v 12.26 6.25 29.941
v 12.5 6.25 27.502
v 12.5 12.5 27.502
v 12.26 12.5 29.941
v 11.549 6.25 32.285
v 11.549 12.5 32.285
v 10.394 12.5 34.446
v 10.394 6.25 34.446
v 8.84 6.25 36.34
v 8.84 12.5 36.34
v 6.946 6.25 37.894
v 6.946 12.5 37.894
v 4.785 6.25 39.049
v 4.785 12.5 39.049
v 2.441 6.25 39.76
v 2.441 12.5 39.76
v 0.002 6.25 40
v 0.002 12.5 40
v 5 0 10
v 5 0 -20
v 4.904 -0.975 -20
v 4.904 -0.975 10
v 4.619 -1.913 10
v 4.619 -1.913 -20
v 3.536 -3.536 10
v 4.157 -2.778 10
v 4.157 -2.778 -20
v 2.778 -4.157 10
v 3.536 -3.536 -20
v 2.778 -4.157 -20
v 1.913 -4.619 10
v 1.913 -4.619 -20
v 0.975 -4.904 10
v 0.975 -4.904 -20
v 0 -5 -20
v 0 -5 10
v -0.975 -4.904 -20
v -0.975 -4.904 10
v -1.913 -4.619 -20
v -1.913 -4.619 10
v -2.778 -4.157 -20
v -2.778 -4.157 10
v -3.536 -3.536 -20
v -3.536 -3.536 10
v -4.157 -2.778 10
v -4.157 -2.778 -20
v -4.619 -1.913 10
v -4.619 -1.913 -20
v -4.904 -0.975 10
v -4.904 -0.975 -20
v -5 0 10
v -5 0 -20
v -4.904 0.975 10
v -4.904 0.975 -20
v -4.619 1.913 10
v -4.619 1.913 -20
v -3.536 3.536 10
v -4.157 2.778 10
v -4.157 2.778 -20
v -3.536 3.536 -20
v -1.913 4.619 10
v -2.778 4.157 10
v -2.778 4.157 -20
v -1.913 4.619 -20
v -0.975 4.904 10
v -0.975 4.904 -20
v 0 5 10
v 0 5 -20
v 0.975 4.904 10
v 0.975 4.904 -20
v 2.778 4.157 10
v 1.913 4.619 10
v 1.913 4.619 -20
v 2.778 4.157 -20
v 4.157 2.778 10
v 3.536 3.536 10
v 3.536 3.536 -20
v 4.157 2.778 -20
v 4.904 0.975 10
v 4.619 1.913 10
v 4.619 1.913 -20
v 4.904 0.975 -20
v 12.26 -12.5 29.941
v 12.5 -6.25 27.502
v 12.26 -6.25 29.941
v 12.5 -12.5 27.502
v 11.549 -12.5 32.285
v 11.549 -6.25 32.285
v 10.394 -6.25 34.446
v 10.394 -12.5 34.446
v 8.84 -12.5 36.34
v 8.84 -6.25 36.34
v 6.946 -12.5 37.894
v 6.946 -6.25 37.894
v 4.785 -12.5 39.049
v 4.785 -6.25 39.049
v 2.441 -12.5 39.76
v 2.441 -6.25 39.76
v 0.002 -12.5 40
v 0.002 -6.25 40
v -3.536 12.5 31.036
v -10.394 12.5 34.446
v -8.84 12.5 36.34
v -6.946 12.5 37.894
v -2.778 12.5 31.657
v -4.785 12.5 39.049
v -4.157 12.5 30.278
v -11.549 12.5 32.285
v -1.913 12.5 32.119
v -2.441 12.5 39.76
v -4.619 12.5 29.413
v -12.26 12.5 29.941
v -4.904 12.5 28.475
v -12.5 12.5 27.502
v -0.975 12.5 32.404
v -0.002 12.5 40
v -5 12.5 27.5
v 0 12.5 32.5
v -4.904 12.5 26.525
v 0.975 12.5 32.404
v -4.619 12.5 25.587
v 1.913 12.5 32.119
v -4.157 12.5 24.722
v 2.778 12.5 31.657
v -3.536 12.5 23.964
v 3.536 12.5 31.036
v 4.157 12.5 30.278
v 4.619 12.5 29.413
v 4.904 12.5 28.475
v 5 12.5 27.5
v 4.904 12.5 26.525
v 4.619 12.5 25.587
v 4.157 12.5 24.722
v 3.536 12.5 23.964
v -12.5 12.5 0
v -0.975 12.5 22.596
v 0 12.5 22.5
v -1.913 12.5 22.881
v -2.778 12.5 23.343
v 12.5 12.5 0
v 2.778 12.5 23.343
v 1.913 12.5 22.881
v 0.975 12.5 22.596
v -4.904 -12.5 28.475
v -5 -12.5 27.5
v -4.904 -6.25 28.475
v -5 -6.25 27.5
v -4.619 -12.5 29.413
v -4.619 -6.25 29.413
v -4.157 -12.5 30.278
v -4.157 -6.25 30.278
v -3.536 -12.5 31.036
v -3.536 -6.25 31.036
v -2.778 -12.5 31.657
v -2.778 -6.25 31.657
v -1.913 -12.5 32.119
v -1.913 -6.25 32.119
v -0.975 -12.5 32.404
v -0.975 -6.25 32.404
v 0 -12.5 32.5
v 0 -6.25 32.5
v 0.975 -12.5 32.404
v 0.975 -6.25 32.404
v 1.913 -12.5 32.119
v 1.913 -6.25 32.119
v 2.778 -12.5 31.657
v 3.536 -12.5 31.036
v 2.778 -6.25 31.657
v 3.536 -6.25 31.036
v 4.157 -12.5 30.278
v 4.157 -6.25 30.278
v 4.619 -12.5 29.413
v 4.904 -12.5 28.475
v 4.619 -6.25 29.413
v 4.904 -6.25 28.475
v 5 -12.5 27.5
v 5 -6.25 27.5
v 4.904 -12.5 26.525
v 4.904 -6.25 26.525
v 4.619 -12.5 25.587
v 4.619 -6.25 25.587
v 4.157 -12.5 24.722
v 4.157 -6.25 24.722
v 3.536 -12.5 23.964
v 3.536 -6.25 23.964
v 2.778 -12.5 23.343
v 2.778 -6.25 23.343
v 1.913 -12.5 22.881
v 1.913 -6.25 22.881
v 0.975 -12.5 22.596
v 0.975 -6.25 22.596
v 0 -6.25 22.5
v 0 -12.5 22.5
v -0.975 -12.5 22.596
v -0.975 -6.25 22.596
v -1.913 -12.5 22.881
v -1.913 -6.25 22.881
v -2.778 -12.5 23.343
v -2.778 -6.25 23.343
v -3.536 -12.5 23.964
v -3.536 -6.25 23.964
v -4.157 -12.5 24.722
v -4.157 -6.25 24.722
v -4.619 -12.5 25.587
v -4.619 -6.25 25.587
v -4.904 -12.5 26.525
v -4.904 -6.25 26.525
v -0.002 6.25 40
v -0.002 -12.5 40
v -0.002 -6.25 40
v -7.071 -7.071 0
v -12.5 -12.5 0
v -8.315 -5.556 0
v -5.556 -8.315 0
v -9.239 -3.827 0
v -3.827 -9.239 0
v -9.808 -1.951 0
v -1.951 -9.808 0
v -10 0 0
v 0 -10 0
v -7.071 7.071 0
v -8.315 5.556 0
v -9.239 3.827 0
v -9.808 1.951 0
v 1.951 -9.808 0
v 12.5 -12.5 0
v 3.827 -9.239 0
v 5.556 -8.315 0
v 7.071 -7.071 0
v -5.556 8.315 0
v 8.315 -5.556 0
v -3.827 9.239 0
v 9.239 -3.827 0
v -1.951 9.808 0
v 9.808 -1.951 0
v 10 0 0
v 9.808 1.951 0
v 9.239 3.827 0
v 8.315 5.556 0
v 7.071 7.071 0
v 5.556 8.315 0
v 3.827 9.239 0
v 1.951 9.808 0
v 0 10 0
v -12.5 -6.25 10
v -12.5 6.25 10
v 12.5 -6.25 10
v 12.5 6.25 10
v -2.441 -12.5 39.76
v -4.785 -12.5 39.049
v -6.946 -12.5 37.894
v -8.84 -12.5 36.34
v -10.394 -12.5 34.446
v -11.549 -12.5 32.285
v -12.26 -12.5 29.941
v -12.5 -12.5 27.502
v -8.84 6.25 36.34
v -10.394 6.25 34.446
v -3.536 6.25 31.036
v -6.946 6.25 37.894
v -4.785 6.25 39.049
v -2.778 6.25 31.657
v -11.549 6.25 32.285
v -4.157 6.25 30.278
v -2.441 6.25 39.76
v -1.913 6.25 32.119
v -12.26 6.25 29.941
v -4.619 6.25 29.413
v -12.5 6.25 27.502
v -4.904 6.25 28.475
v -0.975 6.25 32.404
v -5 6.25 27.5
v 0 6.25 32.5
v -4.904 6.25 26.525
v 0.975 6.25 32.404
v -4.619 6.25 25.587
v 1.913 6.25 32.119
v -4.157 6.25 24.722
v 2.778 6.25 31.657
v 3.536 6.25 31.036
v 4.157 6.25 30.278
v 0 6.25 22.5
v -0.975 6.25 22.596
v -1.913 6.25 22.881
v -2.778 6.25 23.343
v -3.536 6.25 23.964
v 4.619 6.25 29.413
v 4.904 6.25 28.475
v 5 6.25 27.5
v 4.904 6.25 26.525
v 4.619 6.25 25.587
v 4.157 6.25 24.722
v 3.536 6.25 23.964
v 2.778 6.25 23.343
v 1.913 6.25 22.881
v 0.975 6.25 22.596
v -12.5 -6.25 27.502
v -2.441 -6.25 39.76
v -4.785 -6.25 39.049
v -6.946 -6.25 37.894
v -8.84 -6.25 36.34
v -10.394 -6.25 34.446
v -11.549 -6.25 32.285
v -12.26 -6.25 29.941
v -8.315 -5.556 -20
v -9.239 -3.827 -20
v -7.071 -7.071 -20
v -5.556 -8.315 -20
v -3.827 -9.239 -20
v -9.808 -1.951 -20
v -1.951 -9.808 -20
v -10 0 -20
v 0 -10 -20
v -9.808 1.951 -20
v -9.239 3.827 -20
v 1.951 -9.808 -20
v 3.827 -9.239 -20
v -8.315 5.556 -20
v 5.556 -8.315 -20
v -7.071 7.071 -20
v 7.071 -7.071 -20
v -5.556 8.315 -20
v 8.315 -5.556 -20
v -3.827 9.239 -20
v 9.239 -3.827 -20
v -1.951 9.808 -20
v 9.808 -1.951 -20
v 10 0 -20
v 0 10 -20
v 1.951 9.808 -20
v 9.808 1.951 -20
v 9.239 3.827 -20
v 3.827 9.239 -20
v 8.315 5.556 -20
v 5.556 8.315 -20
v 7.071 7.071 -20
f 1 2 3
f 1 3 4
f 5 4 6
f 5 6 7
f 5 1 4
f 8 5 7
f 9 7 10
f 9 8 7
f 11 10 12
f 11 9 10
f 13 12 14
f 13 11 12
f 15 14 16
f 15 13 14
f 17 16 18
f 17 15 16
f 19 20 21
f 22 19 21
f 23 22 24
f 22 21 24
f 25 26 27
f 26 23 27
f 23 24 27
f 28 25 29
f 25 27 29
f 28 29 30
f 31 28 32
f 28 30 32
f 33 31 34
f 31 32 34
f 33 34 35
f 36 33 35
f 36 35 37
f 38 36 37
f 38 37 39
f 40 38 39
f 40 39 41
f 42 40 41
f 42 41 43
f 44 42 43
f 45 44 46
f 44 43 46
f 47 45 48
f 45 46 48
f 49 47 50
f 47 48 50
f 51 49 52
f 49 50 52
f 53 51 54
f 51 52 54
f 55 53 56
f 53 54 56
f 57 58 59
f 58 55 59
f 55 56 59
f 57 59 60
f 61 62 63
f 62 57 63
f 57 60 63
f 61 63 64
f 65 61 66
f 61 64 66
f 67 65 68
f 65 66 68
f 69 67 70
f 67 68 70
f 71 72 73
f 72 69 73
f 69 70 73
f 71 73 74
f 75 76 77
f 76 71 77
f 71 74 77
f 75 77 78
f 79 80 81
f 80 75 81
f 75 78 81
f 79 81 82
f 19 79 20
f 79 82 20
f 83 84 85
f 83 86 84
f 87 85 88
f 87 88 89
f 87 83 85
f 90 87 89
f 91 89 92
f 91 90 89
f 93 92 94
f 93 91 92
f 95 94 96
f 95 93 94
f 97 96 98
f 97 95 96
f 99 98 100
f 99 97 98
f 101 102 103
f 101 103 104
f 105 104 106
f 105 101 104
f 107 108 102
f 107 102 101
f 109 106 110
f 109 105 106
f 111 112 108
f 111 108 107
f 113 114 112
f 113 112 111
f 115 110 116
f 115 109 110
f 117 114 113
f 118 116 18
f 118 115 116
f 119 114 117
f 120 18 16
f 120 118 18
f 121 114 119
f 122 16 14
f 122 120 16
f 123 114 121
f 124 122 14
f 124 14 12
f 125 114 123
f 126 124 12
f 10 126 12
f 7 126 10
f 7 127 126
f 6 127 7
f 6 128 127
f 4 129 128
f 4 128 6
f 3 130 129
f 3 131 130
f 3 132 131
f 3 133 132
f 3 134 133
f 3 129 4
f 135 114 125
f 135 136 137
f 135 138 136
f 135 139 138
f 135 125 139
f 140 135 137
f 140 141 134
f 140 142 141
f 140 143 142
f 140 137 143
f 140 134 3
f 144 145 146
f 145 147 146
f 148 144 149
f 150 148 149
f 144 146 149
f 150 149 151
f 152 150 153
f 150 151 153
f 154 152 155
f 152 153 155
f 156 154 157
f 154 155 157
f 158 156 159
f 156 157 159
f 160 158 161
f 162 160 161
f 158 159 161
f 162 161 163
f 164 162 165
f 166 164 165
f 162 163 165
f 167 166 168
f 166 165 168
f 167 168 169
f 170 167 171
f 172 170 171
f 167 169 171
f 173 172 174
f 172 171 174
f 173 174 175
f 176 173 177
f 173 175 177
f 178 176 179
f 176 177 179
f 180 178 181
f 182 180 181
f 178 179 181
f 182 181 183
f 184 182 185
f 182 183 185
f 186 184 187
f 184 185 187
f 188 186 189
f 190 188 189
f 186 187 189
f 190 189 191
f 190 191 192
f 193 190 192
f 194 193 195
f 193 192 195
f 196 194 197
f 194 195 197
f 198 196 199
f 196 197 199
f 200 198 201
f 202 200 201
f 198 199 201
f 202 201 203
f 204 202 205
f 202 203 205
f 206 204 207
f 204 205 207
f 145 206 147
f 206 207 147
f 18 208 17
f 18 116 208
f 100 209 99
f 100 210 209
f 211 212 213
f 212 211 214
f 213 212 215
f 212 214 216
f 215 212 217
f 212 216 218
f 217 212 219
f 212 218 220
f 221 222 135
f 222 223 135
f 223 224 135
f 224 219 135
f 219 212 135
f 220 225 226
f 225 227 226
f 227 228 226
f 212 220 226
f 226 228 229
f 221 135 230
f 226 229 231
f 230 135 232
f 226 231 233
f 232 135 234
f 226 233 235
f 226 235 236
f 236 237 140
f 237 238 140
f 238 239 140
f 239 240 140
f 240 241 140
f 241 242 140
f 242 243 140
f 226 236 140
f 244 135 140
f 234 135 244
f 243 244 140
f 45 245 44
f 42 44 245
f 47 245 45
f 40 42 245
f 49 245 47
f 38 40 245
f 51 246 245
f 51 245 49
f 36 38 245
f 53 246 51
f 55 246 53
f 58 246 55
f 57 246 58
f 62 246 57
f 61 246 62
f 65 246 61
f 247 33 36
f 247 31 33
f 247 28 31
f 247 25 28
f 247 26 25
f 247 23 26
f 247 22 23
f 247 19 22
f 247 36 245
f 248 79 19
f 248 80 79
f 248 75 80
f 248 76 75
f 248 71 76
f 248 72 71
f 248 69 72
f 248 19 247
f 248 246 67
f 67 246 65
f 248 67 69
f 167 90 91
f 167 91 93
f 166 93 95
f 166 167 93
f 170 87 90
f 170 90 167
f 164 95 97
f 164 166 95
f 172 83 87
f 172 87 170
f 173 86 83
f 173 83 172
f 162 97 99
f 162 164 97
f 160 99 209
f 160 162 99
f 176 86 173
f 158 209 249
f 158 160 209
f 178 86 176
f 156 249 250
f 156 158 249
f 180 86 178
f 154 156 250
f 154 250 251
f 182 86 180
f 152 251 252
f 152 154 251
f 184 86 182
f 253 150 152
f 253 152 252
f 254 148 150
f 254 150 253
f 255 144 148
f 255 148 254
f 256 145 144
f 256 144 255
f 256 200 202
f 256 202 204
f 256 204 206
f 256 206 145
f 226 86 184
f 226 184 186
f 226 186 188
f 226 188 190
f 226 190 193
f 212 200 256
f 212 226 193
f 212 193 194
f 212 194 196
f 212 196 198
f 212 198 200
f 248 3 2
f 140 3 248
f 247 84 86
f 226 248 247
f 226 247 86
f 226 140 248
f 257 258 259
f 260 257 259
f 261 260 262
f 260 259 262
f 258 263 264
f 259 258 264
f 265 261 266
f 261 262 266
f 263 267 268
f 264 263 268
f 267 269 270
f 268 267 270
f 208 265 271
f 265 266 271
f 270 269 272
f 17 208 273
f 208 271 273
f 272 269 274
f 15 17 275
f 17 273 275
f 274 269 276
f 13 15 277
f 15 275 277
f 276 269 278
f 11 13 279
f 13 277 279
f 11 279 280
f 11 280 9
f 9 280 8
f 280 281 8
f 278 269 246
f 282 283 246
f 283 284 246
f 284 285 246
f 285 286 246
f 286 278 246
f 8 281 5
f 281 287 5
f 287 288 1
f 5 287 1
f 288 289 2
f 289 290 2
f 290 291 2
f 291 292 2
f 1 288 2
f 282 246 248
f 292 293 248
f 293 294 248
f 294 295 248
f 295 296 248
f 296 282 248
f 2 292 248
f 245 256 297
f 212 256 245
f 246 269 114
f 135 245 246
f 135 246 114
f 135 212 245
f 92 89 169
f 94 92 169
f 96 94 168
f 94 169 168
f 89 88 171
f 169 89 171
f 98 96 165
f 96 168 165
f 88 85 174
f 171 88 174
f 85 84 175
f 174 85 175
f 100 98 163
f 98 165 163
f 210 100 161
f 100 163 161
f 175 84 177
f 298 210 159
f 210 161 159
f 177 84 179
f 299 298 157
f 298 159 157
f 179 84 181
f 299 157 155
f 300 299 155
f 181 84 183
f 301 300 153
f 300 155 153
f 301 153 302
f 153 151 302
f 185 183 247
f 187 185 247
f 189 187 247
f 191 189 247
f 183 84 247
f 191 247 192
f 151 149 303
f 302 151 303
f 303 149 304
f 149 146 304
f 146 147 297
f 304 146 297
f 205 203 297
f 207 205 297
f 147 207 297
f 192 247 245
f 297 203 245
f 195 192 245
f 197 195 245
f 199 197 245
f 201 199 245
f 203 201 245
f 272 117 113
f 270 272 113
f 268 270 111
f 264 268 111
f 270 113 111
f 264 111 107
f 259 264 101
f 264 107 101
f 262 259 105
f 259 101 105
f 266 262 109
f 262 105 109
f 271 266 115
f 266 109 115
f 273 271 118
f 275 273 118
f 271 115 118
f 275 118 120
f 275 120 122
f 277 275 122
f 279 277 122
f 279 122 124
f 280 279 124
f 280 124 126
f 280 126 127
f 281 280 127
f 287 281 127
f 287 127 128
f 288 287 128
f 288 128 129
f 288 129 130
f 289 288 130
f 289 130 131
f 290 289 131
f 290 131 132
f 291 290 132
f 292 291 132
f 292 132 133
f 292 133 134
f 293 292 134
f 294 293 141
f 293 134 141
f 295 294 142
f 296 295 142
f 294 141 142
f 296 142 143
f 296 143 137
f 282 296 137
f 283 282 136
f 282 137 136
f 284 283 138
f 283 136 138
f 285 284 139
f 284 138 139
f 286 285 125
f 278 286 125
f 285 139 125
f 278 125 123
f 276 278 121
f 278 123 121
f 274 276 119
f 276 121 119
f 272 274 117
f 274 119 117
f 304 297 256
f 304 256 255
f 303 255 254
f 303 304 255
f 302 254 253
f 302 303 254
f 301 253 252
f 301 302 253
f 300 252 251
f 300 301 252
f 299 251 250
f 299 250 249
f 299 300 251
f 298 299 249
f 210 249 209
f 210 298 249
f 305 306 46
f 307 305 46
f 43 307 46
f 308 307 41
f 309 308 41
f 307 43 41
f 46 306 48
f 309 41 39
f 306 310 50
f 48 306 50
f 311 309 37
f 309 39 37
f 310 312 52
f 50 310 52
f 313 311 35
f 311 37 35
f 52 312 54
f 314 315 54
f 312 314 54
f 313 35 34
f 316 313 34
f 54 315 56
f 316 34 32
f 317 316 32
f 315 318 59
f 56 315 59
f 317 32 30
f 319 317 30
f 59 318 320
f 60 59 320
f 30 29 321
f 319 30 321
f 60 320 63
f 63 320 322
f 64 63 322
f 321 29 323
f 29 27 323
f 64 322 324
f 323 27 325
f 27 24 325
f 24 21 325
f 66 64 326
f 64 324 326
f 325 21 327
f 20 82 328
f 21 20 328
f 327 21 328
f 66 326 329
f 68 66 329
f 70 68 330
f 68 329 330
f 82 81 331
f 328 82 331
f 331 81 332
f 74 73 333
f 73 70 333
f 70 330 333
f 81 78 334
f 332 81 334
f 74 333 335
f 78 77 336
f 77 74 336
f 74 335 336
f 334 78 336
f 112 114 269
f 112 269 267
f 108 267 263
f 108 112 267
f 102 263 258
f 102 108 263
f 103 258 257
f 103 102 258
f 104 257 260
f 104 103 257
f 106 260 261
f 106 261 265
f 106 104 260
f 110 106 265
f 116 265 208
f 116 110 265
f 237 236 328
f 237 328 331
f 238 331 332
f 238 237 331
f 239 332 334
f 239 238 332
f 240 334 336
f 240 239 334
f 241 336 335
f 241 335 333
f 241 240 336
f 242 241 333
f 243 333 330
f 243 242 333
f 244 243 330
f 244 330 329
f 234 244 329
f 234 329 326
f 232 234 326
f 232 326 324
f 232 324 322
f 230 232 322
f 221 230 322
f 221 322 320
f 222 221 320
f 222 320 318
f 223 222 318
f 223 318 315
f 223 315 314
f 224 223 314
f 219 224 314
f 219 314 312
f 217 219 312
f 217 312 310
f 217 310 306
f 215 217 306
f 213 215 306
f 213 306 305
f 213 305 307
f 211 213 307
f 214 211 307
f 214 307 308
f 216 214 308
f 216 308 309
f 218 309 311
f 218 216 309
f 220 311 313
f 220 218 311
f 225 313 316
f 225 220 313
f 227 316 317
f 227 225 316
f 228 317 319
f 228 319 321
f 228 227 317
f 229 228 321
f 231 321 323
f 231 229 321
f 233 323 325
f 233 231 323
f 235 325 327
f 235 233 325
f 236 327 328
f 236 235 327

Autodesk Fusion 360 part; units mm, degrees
sketch "Sketch1" plane through (0, 0, 0) normal (0, 0, 1) x (1, 0, 0)
  circle A0 centre (0, 0) radius 10
  line L0 (-12.5, 12.5) -> (12.5, 12.5)
  line L1 (12.5, 12.5) -> (12.5, -12.5)
  line L2 (12.5, -12.5) -> (-12.5, -12.5)
  line L3 (-12.5, -12.5) -> (-12.5, 12.5)
  line L4 (-12.5, 6.25) -> (12.5, 6.25)
  line L5 (12.5, 6.25) -> (12.5, -6.25)
  line L6 (12.5, -6.25) -> (-12.5, -6.25)
  line L7 (-12.5, -6.25) -> (-12.5, 6.25)
  circle A1 centre (0, 0) radius 5
  dimension "d1" = 20
  dimension "d2" = 25
  dimension "d3" = 25
  dimension "d4" = 12.5
  dimension "d5" = 12.5
  dimension "d6" = 25
  dimension "d7" = 12.5
  dimension "d8" = 6.25
  dimension "d9" = 10
extrude "Extrude1" add sketch "Sketch1" along normal blind 40 contours A0 L4 | A0 L0 L1 L3 L4 | A0 L1 L2 L3 L6 | A0 L6 makes body 1 at (-4.1667, 6.25, 13.3333) makes body 2 at (4.1667, -6.25, 13.3333)
extrude "Extrude2" add sketch "Sketch1" against normal blind 20 contours A0 L4 L6 | A0 L4 | A0 L6 bodies 1 2
extrude "Extrude3" add sketch "Sketch1" along normal blind 10 contours A0 L4 L6 | A0 L1 L4 L5 L6 | A0 L3 L4 L6 L7 bodies 1
sketch "Sketch2" plane through (0, 12.5, 0) normal (0, 1, 0) x (-1, 0, 0)
  line L0 (-12.5, 0) -> (12.5, 0)
  line L1 (12.5, 0) -> (12.5, 40)
  line L2 (12.5, 40) -> (-12.5, 40)
  line L3 (-12.5, 40) -> (-12.5, 0)
  circle A0 centre (0, 27.5) radius 5
  line L4 (12.5, 0) -> (-12.5, 0)
  dimension "d16" = 10
  dimension "d17" = 27.5
extrude "Extrude4" cut sketch "Sketch2" against normal up to surface (25 mm away) contours A0 bodies 1
fillet "Fillet1" radius 12.5 4 edges at (12.5, 9.375, 40) (-12.5, 9.375, 40) (-12.5, -9.375, 40) (12.5, -9.375, 40) on bodies 1
equation "d4 = ( 25 / 2 ) * 1 mm"
equation "d5 = ( 25 / 2 ) * 1 mm"
equation "d8 = ( 12.5 / 2 ) * 1 mm"
